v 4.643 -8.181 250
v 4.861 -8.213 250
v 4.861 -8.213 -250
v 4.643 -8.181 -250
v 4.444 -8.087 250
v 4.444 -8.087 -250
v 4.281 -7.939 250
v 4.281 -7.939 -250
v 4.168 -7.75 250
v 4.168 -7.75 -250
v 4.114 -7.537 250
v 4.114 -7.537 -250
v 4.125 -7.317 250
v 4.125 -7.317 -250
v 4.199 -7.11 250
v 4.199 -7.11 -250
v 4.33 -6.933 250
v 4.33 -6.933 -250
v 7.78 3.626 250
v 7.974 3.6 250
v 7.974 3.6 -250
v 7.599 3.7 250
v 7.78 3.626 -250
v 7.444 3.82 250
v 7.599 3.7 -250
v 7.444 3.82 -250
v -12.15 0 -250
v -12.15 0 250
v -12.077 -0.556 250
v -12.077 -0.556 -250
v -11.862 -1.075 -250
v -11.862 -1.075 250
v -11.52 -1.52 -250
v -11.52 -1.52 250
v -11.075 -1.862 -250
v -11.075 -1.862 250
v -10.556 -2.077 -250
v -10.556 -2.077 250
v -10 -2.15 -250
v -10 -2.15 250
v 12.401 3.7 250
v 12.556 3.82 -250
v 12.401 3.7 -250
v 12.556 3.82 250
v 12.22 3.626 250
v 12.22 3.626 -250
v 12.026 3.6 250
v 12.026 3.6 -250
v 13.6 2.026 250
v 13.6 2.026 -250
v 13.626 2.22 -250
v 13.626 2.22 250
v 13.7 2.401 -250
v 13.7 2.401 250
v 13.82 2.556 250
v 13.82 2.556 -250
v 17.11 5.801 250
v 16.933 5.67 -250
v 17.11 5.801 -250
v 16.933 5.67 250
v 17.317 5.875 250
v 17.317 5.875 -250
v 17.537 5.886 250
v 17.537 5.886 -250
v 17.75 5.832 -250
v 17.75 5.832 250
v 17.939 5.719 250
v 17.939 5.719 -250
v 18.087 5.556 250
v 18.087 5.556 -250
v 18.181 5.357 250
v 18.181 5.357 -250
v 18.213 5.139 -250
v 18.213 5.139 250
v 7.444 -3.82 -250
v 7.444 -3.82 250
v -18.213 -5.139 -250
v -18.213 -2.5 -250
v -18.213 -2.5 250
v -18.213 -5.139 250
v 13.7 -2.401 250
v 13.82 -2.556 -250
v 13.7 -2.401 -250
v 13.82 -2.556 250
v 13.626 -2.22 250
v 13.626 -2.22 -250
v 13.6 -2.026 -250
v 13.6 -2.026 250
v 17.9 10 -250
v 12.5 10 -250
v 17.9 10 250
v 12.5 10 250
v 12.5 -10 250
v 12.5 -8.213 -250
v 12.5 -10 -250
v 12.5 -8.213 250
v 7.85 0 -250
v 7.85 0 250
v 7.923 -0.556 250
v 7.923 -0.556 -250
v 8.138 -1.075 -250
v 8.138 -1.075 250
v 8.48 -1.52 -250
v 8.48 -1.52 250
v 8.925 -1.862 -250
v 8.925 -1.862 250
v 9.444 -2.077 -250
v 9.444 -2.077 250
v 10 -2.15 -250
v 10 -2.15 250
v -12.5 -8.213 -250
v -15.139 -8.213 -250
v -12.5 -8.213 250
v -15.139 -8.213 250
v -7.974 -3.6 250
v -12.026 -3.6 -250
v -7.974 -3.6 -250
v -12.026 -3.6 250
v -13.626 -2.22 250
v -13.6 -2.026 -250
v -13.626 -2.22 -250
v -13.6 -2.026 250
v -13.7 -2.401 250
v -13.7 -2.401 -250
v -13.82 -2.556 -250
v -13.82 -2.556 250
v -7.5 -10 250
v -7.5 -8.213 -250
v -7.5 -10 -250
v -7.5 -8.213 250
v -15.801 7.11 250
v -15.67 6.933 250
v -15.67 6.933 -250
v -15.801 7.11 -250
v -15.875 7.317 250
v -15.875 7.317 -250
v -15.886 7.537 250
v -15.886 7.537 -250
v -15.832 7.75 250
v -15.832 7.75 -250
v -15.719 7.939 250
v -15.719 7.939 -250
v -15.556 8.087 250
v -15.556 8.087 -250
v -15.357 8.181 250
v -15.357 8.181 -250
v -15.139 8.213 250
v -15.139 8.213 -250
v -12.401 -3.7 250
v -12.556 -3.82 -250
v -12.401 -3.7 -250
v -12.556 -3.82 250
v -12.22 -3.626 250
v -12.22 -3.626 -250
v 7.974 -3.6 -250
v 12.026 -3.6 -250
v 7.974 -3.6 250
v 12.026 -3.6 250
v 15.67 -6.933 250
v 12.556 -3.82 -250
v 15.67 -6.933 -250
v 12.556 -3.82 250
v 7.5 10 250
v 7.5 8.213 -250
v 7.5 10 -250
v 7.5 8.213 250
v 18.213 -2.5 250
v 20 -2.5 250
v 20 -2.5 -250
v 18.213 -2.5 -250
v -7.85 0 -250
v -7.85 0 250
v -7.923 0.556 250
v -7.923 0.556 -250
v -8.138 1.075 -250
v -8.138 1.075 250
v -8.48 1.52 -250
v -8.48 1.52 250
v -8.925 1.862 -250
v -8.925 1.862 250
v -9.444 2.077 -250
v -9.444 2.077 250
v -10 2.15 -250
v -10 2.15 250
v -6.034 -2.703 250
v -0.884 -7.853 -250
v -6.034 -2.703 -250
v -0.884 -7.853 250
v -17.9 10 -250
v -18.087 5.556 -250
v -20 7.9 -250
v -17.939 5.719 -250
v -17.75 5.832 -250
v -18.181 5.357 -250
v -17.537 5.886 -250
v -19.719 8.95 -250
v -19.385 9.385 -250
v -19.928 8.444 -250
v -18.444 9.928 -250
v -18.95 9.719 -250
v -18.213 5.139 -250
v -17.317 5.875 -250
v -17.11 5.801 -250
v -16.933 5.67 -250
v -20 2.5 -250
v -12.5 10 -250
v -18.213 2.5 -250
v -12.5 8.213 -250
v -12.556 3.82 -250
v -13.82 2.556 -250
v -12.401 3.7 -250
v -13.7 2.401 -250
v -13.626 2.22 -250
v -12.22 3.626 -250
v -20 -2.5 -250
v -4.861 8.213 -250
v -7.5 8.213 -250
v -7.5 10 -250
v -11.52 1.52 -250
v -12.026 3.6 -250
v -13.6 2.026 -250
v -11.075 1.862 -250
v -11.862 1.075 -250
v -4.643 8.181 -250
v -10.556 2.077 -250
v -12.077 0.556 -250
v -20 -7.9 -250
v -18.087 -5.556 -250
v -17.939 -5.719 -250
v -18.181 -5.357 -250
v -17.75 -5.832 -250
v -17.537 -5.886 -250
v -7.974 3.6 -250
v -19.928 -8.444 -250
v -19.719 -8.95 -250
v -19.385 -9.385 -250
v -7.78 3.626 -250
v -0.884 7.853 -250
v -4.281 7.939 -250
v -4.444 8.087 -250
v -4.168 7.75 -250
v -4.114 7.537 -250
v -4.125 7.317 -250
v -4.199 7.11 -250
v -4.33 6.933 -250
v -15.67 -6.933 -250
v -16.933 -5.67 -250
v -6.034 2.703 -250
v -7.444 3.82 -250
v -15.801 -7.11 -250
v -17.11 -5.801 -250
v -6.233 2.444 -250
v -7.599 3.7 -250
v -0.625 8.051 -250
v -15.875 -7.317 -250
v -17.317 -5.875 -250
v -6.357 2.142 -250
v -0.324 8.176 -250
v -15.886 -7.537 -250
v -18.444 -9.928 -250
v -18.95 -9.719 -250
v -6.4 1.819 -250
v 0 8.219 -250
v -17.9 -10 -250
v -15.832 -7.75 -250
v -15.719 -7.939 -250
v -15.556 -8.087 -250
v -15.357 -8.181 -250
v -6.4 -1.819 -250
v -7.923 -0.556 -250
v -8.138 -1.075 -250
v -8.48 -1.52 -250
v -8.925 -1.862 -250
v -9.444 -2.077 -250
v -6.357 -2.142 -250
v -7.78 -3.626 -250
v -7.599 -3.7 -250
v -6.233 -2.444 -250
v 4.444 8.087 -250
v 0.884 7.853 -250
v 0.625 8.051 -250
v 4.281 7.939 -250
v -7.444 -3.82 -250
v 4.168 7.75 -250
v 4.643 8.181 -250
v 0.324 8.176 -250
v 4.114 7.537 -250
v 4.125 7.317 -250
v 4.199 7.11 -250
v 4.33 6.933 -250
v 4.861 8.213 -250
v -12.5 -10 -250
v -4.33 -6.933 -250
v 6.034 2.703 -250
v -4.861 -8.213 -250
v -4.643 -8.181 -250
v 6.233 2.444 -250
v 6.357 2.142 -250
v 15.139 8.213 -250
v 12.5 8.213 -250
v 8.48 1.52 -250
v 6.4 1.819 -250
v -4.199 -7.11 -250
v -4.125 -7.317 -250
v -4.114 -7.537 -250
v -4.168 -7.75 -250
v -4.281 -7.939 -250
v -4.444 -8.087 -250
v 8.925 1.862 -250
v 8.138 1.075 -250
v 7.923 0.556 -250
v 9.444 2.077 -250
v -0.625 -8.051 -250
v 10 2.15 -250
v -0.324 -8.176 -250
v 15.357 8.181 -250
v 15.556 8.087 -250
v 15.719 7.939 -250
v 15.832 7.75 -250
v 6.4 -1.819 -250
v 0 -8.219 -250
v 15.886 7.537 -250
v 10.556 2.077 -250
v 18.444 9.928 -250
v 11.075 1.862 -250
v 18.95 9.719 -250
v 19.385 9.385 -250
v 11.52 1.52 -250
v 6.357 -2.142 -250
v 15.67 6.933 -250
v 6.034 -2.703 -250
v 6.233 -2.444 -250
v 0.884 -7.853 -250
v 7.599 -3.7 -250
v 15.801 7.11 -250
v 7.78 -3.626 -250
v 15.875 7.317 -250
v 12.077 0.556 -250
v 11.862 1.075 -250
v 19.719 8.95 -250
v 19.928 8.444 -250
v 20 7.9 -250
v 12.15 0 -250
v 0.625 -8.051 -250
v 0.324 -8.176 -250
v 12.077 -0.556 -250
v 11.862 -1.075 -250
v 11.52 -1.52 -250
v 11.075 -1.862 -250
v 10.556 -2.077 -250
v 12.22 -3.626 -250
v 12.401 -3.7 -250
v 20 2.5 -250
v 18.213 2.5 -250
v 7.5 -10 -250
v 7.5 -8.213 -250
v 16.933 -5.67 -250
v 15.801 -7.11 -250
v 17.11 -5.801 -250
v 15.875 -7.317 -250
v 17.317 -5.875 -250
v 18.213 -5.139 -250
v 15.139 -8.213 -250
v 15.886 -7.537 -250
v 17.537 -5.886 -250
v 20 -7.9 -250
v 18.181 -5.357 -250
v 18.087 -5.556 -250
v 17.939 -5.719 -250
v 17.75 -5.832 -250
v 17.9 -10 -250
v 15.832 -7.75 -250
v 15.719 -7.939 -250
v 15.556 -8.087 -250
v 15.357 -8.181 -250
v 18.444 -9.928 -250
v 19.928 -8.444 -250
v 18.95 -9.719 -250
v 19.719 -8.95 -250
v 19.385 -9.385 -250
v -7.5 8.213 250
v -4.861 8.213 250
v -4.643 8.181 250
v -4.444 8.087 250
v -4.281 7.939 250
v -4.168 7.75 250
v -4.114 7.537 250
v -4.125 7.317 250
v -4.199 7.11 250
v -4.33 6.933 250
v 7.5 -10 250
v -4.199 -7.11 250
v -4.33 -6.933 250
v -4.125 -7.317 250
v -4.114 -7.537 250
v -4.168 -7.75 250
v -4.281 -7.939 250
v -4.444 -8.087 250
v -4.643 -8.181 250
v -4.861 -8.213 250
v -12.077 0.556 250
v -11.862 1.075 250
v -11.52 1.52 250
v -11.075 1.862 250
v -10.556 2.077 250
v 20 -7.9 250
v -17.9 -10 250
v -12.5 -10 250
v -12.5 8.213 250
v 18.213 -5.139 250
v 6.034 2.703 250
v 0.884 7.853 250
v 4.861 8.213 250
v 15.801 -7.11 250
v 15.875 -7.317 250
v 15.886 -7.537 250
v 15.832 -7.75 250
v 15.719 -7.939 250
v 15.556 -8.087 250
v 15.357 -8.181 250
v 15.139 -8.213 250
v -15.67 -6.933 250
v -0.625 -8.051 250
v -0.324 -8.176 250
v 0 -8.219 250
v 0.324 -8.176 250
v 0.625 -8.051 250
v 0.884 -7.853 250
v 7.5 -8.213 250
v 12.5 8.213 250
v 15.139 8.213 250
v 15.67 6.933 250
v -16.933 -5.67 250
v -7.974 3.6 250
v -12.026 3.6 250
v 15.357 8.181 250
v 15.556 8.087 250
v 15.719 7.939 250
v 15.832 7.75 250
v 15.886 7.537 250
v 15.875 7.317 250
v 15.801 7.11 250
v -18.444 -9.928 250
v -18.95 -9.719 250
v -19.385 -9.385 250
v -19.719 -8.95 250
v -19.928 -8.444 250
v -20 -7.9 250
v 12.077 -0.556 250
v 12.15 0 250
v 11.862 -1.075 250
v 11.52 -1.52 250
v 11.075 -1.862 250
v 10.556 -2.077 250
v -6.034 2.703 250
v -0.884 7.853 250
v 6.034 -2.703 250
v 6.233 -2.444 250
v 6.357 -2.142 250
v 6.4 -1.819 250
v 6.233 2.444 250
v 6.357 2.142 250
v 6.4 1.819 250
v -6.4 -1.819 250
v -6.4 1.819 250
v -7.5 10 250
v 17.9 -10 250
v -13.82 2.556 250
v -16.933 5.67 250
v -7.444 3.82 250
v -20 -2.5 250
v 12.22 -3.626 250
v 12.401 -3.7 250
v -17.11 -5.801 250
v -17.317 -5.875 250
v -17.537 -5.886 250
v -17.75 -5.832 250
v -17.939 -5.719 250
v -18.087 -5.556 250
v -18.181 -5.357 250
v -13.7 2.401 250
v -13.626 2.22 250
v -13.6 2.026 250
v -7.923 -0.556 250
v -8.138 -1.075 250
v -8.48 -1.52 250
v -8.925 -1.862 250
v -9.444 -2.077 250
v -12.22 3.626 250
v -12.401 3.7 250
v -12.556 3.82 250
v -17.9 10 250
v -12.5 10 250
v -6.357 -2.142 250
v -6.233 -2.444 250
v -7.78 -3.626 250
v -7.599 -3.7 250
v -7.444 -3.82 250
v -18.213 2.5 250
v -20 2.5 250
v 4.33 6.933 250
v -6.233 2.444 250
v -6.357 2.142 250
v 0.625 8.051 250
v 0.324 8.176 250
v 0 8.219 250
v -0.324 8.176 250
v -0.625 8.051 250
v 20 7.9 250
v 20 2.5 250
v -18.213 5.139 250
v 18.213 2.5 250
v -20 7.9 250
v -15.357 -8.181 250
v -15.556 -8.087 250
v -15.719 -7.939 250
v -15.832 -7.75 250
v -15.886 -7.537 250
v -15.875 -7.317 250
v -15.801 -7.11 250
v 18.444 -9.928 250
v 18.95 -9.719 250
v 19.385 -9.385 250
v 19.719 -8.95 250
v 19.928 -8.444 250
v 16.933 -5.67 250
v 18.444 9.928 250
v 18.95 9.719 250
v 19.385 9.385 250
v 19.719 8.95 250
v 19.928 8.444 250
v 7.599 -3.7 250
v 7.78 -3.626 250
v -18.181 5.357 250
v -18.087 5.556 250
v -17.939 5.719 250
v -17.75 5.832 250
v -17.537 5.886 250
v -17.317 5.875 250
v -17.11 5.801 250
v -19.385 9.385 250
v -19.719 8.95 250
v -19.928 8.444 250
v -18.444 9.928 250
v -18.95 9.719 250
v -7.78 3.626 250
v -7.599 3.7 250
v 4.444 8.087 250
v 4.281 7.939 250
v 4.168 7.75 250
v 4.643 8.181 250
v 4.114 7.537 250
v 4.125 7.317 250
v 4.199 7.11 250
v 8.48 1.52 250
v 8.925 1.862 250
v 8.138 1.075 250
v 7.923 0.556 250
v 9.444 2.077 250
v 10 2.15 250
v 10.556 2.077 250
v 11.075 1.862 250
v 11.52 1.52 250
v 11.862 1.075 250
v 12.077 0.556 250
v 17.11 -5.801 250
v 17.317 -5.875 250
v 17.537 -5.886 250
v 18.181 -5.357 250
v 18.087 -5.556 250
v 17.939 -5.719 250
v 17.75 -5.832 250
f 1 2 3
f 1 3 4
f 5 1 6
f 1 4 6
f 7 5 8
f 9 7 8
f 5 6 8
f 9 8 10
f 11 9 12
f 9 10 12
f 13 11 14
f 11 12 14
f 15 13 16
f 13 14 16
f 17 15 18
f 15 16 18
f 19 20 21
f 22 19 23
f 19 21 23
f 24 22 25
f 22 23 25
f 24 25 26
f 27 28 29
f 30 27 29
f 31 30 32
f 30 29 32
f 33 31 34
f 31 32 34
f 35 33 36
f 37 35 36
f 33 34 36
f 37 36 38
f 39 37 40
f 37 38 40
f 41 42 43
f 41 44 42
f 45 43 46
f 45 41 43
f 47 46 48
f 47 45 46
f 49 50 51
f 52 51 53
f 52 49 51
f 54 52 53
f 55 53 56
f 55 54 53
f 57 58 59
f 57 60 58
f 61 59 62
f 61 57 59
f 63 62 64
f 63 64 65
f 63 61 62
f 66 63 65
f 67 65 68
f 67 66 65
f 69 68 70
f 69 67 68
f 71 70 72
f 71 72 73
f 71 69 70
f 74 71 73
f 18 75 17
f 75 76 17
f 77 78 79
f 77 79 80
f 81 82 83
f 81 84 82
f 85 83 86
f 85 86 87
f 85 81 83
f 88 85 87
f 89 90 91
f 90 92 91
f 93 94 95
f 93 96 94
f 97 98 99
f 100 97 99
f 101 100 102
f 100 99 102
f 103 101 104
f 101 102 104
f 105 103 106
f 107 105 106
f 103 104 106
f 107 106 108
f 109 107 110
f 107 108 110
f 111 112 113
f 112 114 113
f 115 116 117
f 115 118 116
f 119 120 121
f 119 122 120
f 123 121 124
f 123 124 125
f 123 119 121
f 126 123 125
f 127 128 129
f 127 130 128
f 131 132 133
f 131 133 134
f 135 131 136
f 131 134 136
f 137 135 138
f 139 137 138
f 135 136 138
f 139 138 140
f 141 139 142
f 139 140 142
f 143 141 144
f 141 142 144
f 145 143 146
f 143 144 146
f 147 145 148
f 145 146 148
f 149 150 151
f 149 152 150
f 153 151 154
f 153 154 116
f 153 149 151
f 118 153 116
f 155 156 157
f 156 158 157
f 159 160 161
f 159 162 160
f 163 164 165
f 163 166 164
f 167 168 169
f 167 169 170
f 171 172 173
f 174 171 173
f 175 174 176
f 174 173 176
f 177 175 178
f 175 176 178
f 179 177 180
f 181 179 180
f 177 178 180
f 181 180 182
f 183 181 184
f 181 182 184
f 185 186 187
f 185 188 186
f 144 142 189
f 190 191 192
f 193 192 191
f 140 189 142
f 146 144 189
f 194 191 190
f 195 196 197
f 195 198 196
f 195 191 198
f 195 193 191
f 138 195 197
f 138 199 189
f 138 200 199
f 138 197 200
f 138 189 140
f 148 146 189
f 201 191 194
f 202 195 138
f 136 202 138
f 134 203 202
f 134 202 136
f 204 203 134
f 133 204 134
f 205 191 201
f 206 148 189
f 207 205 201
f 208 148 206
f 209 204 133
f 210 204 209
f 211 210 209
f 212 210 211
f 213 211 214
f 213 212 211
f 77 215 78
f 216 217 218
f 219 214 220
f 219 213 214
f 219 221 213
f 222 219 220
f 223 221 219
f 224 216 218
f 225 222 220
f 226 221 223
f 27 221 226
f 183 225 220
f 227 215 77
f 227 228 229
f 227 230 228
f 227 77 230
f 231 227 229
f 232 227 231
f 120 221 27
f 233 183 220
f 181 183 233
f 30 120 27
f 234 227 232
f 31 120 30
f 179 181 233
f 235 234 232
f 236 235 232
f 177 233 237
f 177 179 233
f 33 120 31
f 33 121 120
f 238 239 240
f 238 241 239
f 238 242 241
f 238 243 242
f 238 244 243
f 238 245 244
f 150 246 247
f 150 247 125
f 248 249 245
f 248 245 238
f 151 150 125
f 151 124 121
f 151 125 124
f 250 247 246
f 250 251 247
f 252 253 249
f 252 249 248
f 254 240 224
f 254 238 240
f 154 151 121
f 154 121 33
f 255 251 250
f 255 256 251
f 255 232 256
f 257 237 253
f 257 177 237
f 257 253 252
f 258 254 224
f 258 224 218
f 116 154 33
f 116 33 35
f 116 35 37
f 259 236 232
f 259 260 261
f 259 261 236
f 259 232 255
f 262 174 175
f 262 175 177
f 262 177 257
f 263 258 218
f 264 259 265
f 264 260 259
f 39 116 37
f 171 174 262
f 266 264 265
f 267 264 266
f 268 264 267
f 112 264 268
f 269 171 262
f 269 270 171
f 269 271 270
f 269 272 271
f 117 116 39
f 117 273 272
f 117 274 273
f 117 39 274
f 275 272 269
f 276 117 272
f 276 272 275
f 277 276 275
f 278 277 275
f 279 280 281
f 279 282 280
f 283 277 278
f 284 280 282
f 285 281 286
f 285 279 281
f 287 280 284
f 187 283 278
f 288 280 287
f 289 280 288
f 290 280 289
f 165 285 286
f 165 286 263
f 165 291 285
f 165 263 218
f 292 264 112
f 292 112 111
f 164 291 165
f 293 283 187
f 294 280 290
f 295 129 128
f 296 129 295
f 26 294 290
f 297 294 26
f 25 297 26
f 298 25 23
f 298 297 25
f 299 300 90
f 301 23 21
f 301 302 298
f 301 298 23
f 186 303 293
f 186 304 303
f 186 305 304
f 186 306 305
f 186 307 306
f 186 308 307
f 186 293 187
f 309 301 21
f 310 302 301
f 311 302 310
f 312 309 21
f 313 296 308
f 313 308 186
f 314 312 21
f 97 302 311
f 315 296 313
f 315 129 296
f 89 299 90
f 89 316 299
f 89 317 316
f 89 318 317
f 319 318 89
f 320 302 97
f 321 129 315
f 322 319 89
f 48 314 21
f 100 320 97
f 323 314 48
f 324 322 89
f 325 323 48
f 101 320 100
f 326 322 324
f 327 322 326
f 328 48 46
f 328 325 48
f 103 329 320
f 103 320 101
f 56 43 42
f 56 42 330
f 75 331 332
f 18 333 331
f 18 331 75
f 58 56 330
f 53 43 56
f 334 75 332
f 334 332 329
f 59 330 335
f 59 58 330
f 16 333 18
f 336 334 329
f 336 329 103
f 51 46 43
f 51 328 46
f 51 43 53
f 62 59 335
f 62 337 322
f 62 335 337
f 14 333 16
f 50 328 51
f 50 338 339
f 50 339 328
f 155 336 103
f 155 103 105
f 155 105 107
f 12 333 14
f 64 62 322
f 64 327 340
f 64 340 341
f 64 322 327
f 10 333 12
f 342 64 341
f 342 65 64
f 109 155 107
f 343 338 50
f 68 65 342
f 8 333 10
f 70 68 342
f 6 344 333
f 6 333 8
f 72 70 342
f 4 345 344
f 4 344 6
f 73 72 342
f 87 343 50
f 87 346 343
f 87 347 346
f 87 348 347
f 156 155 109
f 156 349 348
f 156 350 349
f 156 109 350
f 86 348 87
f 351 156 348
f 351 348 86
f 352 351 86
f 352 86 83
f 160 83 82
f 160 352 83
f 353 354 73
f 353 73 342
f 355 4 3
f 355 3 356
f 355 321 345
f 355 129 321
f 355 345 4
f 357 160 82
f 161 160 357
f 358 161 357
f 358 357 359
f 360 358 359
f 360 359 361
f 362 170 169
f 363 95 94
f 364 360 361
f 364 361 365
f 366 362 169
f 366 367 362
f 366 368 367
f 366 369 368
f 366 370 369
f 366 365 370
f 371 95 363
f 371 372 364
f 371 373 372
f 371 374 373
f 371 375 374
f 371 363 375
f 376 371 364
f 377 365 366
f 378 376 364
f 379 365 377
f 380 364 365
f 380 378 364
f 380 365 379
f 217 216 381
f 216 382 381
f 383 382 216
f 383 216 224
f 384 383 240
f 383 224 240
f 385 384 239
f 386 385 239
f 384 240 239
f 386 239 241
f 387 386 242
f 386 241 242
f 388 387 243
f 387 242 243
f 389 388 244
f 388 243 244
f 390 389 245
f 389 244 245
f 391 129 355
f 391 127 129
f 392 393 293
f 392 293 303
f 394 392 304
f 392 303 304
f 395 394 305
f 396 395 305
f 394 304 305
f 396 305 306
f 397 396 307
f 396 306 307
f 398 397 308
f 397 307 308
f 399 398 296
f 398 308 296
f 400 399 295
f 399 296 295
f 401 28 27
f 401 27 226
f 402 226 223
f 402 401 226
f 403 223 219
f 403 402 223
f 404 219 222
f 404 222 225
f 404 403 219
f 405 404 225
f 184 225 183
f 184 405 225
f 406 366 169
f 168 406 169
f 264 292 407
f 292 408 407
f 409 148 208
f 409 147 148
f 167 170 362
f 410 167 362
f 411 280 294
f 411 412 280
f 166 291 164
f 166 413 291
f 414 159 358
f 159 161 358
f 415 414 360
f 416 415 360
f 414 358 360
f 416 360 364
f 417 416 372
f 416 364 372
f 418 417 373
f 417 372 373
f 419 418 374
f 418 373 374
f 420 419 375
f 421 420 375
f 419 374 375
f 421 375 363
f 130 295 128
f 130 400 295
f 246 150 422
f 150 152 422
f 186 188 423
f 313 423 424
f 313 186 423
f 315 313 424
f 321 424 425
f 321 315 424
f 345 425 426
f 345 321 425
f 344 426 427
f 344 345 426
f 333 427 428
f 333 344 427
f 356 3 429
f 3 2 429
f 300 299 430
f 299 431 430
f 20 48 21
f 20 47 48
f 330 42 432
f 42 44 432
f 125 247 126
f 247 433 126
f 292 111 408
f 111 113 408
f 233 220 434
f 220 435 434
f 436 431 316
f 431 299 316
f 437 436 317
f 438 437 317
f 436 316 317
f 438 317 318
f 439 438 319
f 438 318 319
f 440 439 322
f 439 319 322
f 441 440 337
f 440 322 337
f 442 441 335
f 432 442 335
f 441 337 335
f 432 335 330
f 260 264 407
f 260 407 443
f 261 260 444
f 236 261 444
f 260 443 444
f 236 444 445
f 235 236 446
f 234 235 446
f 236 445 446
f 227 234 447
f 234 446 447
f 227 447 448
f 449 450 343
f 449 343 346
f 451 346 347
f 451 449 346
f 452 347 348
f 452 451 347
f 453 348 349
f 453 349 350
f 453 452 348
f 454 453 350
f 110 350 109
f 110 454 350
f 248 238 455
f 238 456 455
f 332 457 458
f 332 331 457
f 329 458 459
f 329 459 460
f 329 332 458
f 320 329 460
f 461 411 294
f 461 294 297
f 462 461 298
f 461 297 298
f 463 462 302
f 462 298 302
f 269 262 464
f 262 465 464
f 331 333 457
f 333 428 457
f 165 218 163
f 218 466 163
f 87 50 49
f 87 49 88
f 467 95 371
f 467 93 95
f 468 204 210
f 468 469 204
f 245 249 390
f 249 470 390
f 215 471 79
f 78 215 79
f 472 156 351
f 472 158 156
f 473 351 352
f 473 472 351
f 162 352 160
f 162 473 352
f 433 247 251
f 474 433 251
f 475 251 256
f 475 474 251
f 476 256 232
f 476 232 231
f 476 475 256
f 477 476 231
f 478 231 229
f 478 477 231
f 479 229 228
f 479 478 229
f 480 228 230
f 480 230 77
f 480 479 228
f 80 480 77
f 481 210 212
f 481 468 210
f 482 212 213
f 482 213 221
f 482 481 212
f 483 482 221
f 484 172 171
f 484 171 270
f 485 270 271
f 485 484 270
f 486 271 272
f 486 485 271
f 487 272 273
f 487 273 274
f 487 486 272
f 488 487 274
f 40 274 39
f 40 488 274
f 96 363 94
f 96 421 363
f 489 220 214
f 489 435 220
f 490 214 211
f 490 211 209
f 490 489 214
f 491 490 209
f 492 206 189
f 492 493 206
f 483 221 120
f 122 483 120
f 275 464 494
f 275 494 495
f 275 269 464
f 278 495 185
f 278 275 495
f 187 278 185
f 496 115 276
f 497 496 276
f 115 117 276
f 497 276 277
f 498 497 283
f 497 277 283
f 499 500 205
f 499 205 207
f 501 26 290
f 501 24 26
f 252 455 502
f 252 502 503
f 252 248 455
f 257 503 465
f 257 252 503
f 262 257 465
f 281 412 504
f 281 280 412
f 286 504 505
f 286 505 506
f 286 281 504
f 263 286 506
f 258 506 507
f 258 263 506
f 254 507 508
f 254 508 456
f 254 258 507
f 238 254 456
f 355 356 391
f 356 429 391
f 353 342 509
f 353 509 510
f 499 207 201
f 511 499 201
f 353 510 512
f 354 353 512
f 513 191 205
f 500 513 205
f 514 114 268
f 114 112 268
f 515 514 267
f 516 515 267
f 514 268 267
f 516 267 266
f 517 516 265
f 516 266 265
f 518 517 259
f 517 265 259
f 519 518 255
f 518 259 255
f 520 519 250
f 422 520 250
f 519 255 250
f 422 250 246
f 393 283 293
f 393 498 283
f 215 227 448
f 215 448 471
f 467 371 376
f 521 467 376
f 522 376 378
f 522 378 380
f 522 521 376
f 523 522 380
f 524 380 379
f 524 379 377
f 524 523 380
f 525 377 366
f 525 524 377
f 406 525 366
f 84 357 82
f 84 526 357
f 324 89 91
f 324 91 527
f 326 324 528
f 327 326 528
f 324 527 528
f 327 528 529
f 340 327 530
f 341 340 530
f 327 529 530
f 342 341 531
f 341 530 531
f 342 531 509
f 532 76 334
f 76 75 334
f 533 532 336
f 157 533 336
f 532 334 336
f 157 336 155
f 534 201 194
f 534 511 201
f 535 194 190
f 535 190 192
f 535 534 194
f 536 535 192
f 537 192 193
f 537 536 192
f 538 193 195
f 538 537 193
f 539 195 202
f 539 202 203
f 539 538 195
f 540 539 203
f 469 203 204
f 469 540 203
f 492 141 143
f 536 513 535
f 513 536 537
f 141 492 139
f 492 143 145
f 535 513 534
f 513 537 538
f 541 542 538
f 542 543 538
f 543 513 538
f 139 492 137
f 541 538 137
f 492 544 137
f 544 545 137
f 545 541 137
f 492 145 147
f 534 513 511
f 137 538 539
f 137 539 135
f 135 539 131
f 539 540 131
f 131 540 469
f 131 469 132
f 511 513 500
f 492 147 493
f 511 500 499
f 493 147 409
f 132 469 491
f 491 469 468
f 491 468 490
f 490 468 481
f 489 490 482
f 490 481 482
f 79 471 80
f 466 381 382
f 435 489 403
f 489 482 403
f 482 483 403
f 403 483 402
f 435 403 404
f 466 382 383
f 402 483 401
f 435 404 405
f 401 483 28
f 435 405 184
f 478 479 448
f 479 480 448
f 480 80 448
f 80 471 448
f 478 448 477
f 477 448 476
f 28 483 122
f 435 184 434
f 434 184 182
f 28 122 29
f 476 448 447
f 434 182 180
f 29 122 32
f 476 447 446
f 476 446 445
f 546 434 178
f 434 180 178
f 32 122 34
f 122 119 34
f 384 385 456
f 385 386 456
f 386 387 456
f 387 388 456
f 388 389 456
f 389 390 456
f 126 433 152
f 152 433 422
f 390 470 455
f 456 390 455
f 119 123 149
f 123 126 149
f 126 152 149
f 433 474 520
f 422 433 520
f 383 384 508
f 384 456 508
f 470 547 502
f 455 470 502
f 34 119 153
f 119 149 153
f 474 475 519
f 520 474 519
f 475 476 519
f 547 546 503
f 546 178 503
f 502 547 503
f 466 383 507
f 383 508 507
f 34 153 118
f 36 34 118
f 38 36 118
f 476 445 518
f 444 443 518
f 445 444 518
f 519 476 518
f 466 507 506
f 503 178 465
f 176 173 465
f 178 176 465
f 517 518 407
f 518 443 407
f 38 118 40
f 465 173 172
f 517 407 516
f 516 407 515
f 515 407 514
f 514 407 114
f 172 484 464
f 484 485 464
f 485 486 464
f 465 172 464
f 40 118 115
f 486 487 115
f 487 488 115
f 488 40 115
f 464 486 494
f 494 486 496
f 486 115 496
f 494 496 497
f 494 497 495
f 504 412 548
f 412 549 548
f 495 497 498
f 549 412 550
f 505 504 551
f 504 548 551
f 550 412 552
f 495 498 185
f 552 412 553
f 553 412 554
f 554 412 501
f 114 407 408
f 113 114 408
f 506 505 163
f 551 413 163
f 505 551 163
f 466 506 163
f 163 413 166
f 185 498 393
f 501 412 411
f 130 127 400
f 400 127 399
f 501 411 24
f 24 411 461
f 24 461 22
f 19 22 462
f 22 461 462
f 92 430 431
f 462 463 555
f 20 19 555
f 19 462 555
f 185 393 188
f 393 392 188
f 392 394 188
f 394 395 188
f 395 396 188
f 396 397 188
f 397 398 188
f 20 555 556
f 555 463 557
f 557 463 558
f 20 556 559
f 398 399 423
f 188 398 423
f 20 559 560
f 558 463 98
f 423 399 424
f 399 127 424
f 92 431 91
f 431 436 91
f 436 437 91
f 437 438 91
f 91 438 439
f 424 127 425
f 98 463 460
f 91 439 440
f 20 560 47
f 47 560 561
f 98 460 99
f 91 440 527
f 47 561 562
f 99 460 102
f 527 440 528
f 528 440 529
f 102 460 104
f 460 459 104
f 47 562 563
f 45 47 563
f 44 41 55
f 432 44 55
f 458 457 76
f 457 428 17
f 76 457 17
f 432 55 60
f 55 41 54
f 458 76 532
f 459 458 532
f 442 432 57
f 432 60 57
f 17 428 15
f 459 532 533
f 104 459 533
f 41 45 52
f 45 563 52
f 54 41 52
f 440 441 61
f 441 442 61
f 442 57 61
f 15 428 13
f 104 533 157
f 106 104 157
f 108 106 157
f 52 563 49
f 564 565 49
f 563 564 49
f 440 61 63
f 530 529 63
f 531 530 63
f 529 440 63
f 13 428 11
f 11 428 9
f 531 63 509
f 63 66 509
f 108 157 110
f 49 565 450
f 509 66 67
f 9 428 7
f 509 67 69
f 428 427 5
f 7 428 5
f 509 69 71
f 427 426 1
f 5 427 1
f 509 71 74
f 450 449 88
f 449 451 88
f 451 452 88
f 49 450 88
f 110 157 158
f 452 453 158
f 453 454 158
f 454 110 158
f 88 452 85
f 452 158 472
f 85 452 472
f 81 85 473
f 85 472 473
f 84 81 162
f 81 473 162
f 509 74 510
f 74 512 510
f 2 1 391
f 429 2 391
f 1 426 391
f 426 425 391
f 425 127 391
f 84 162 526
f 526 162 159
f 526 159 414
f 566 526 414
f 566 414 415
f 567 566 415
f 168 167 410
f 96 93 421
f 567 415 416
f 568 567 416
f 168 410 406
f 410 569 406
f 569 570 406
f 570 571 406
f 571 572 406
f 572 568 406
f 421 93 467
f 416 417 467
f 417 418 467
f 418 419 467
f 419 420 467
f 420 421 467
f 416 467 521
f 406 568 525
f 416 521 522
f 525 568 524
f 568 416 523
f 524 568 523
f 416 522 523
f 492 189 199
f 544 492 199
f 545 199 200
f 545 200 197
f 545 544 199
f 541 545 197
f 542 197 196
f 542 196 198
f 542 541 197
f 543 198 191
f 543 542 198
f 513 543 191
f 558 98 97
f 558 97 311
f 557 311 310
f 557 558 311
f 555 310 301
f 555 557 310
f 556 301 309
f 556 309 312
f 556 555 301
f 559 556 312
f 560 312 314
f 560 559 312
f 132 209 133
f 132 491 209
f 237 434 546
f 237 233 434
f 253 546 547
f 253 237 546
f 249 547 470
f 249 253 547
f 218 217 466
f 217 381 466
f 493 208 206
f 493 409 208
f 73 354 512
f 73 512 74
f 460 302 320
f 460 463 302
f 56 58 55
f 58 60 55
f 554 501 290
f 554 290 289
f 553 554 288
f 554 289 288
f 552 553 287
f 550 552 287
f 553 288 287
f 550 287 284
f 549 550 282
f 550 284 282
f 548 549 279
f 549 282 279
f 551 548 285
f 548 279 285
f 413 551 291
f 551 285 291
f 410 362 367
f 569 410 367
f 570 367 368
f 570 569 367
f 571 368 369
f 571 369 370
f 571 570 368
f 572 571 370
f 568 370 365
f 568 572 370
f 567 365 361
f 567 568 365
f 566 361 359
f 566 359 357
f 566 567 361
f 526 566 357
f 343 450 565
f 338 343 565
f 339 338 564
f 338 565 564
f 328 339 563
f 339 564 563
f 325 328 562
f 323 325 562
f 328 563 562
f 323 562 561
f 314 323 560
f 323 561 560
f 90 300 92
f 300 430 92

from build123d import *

# Parameters (mm, degrees)
BOSS_EXTRUDE1_DEPTH = 250
BOSS_EXTRUDE2_DEPTH = 250
FILLET1_R           = 0.75
FILLET2_R           = 1.25


with BuildPart() as part:
    # Sketch3 → Boss-Extrude1 (new, symmetric)
    with BuildSketch(Plane.XY):
        with BuildLine():
            Line((12.5, -10), (17.9, -10))
            ThreePointArc((17.9, -10), (19.38492424, -9.38492424), (20, -7.9))
            Line((20, -7.9), (20, -2.5))
            Line((20, -2.5), (18.213351365, -2.5))
            Line((18.213351365, -2.5), (18.213351365, -6.95))
            Line((18.213351365, -6.95), (13.6, -2.336648635))
            Line((13.6, -2.336648635), (13.6, 0))
            Line((13.6, 0), (12.15, 0))
            ThreePointArc((12.15, 0), (11.52027958, -1.52027958), (10, -2.15))
            Line((10, -2.15), (10, -3.6))
            Line((10, -3.6), (12.336648635, -3.6))
            Line((12.336648635, -3.6), (16.95, -8.213351365))
            Line((16.95, -8.213351365), (12.5, -8.213351365))
            Line((12.5, -8.213351365), (12.5, -10))
        make_face()
    extrude(amount=BOSS_EXTRUDE1_DEPTH, both=True)

    # Sketch4 → Boss-Extrude2 (add, symmetric)
    with BuildSketch(Plane.XY):
        with BuildLine():
            Line((10, -3.6), (7.663351365, -3.6))
            Line((7.663351365, -3.6), (3.05, -8.213351365))
            Line((3.05, -8.213351365), (7.5, -8.213351365))
            Line((7.5, -8.213351365), (7.5, -10))
            Line((7.5, -10), (0, -10))
            Line((0, -10), (0, -8.736648635))
            Line((0, -8.736648635), (6.4, -2.336648635))
            Line((6.4, -2.336648635), (6.4, 0))
            Line((6.4, 0), (7.85, 0))
            ThreePointArc((7.85, 0), (8.47972042, -1.52027958), (10, -2.15))
            Line((10, -2.15), (10, -3.6))
        make_face()
    extrude(amount=BOSS_EXTRUDE2_DEPTH, both=True)

    # Mirror1: part across plane


with BuildPart() as part_1:
    add(part.part)
    add(part.part.mirror(Plane(origin=(0, 0, 0), x_dir=(0, 0, 1), z_dir=(1, 0, 0))))

    # Mirror2: part across plane


with BuildPart() as part_2:
    add(part_1.part)
    add(part_1.part.mirror(Plane.ZX))

    # Fillet1
    fillet1_edges = [part_2.edges().sort_by_distance(p)[0] for p in [
        (18.213351365, 6.95, 0),
        (13.6, 2.336648635, 0),
        (12.336648635, 3.6, 0),
        (16.95, 8.213351365, 0),
        (3.05, 8.213351365, 0),
        (7.663351365, 3.6, 0),
        (-18.213351365, 6.95, 0),
        (-13.6, 2.336648635, 0),
        (-7.663351365, 3.6, 0),
        (-12.336648635, 3.6, 0),
        (-16.95, 8.213351365, 0),
        (-3.05, 8.213351365, 0),
        (16.95, -8.213351365, 0),
        (12.336648635, -3.6, 0),
        (13.6, -2.336648635, 0),
        (18.213351365, -6.95, 0),
        (3.05, -8.213351365, 0),
        (7.663351365, -3.6, 0),
        (-18.213351365, -6.95, 0),
        (-13.6, -2.336648635, 0),
        (-12.336648635, -3.6, 0),
        (-16.95, -8.213351365, 0),
        (-3.05, -8.213351365, 0),
        (-7.663351365, -3.6, 0),
    ]]
    fillet(fillet1_edges, radius=FILLET1_R)

    # Fillet2
    fillet2_edges = [part_2.edges().sort_by_distance(p)[0] for p in [
        (6.4, 2.336648635, 0),
        (0, 8.736648635, 0),
        (-6.4, 2.336648635, 0),
        (6.4, -2.336648635, 0),
        (-6.4, -2.336648635, 0),
        (0, -8.736648635, 0),
    ]]
    fillet(fillet2_edges, radius=FILLET2_R)


solid = part_2.part
